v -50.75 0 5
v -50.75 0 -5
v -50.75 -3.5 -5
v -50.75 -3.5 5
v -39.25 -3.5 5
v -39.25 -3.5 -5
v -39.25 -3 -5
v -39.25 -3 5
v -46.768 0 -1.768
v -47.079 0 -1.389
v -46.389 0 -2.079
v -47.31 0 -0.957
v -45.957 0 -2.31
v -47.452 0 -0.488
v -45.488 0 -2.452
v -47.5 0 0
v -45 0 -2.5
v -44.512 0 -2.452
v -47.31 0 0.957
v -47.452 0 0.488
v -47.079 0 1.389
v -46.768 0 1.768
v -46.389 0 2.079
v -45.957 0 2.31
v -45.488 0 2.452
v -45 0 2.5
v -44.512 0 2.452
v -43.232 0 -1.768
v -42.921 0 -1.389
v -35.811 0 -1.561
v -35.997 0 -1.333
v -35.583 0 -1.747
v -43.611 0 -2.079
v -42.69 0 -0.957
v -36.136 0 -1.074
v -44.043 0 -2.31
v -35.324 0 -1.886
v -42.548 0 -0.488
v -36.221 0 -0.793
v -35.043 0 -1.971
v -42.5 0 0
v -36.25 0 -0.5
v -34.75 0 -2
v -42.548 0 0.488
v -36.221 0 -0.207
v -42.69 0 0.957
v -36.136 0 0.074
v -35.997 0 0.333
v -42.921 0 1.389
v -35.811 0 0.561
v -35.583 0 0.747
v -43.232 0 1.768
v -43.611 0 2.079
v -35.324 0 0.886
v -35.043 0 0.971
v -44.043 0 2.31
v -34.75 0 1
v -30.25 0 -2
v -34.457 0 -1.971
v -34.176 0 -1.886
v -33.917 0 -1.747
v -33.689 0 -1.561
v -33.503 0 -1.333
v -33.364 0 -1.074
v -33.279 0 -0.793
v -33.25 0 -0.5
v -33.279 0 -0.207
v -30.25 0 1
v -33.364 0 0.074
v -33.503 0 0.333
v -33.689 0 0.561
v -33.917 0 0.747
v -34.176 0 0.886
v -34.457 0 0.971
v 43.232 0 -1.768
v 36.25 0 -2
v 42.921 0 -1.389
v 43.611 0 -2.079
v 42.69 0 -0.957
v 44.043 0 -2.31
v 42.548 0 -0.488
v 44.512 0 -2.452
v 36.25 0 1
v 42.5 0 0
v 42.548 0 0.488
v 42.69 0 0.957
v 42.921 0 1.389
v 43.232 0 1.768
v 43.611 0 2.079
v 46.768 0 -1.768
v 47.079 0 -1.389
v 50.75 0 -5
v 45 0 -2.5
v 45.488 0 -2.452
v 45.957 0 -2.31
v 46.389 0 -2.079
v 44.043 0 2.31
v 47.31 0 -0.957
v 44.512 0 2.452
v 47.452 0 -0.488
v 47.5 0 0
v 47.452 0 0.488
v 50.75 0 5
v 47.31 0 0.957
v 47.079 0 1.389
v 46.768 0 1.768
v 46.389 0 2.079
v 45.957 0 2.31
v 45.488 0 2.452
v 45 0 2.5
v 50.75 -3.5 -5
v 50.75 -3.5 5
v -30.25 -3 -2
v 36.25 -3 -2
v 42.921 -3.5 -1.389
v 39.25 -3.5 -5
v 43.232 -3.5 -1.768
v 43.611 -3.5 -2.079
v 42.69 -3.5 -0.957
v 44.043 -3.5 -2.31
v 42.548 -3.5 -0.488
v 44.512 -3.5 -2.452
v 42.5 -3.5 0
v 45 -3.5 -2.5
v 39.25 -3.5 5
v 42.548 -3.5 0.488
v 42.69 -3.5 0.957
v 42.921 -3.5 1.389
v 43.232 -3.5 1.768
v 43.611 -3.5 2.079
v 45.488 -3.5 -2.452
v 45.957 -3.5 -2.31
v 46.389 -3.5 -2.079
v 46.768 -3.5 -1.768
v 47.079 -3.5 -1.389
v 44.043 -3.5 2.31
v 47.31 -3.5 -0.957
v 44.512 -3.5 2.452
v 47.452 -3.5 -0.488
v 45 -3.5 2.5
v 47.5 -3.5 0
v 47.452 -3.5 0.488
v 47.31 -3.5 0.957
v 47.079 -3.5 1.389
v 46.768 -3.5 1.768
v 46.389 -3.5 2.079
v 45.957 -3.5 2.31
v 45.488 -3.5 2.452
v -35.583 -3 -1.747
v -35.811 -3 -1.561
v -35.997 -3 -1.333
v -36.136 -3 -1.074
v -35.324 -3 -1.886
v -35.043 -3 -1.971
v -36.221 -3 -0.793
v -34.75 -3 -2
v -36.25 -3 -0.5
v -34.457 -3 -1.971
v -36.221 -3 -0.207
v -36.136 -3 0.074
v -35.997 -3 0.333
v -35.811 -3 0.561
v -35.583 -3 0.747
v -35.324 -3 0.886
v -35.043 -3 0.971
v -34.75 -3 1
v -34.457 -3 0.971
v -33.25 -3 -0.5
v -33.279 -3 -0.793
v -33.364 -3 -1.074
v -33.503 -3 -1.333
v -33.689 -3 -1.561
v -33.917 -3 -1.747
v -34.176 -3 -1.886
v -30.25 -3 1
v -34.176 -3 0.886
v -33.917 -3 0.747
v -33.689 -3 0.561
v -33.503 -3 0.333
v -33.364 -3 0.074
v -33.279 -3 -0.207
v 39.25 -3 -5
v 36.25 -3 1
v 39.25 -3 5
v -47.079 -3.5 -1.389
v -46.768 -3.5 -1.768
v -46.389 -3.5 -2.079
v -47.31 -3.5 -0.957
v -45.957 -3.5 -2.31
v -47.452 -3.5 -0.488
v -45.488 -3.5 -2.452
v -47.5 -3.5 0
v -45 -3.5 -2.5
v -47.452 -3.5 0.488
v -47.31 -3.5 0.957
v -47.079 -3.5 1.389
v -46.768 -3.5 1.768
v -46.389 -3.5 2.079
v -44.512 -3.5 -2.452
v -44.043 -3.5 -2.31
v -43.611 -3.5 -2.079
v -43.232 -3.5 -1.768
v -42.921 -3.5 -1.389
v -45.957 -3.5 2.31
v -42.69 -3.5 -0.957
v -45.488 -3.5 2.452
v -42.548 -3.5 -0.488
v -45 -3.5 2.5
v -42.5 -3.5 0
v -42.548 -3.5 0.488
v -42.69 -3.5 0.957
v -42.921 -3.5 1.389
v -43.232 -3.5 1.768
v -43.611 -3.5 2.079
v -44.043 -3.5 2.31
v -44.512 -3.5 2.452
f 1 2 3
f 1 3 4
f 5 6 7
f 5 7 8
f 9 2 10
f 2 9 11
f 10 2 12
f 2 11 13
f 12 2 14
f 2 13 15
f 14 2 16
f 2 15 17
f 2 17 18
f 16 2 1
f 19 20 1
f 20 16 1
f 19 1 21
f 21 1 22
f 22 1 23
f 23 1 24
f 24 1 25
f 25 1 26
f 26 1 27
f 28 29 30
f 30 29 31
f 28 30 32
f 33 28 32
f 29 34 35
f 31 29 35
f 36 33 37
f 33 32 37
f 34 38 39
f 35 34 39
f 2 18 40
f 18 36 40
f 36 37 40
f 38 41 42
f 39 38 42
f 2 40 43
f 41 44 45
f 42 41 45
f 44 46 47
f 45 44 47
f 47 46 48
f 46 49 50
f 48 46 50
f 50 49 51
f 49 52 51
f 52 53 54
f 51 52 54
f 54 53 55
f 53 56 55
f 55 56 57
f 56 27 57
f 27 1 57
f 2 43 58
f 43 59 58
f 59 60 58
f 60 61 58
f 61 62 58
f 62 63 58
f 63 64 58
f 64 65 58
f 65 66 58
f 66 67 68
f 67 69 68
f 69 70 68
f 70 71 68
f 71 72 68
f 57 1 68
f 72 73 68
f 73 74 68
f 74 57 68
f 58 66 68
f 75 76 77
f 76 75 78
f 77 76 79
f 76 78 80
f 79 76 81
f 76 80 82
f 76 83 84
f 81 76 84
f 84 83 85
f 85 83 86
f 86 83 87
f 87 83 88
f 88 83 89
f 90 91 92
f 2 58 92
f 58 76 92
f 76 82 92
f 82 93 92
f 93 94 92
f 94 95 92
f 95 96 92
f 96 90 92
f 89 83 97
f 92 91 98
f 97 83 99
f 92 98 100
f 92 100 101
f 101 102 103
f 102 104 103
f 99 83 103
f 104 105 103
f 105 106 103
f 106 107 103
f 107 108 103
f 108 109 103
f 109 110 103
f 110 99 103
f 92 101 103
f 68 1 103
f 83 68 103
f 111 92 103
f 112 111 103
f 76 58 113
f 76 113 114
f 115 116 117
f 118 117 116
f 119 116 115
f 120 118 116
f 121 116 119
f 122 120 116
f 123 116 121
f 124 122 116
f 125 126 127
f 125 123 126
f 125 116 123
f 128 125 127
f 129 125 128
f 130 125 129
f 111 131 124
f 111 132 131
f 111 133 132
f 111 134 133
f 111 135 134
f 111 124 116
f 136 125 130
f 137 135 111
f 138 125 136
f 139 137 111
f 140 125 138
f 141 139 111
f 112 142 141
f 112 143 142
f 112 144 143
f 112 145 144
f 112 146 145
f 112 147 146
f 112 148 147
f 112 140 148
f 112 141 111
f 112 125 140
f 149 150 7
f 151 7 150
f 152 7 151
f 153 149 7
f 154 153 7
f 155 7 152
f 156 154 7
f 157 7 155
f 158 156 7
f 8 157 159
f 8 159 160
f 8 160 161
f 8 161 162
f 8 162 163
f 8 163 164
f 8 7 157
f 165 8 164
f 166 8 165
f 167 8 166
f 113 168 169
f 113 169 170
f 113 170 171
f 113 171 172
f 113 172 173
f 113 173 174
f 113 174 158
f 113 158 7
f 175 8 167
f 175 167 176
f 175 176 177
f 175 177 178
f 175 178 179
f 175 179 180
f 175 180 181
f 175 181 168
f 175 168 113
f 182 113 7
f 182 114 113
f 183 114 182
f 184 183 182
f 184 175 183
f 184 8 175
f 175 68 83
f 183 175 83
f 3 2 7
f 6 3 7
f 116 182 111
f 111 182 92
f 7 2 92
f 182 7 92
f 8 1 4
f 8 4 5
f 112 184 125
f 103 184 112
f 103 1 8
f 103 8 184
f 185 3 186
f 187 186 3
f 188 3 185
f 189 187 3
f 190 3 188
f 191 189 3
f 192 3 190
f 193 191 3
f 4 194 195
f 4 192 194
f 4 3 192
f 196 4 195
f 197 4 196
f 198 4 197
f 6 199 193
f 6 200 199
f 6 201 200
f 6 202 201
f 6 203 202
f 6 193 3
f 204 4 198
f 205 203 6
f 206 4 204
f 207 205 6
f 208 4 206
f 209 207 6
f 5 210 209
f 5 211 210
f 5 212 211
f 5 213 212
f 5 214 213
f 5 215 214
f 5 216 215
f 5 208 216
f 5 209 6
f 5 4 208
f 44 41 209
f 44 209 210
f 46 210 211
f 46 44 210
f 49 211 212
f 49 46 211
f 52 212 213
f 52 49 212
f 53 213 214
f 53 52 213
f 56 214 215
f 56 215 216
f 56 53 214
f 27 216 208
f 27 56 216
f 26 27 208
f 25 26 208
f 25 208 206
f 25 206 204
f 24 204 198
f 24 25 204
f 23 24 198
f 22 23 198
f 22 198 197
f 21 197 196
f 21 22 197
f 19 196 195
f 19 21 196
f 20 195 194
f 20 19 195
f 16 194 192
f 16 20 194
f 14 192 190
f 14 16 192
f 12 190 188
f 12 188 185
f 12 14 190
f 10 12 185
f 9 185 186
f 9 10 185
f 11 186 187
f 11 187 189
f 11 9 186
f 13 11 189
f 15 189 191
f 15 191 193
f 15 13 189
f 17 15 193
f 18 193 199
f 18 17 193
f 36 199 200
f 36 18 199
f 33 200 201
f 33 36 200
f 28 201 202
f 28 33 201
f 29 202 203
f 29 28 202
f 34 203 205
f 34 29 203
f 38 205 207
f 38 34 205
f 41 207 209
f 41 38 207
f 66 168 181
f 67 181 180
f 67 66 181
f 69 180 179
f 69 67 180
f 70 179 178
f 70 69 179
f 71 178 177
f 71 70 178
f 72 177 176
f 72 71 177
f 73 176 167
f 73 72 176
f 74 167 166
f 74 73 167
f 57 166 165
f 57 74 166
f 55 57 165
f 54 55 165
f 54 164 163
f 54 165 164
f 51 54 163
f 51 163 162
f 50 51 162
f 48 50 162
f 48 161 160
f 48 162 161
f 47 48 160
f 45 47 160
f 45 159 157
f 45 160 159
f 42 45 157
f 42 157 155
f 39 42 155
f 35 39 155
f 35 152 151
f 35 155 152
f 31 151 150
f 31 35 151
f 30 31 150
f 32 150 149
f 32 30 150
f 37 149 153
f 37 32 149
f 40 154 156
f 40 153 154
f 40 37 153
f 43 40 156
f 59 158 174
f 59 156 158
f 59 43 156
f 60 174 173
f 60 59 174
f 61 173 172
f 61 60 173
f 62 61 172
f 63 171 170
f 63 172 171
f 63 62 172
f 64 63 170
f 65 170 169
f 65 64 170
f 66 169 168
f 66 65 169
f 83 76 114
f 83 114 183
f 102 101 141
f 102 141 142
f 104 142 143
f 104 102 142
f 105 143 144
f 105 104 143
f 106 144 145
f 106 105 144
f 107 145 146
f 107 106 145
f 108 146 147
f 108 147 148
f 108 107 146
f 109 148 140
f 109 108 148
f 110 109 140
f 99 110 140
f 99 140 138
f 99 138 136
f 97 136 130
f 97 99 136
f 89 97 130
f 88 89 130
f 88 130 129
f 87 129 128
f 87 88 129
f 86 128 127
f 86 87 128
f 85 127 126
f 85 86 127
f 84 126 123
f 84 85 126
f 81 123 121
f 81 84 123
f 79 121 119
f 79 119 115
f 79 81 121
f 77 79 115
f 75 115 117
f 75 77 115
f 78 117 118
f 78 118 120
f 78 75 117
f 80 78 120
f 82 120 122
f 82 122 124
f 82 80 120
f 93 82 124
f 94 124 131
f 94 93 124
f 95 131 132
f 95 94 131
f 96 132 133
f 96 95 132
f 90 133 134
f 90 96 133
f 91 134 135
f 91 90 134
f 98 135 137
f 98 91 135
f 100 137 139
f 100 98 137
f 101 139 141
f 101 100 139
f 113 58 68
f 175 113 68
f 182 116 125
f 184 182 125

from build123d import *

# Parameters (mm, degrees)
F0_W     = 101.5
F0_H     = 10
F0_R     = 1.5
F0_W_2   = 66.5
F0_H_2   = 3
F0_R_2   = 2.5
F1_DEPTH = 3.5
F2_W     = 78.5
F2_H     = 10
F3_DEPTH = 0.5


with BuildPart() as f1:
    # F0 (on Front) → F1 (new body)
    with BuildSketch(Plane.XZ):
        Rectangle(F0_W, F0_H)
        with Locations((-34.75, -0.5)):
            Circle(F0_R, mode=Mode.SUBTRACT)
        with Locations((3, -0.5)):
            Rectangle(F0_W_2, F0_H_2, mode=Mode.SUBTRACT)
        with Locations((-45, 0)):
            Circle(F0_R_2, mode=Mode.SUBTRACT)
        with Locations((45, 0)):
            Circle(F0_R_2, mode=Mode.SUBTRACT)
    extrude(amount=F1_DEPTH)

    # F2 (on face) → F3 (cut)
    with BuildSketch(Plane.XZ.offset(3.5)):
        Rectangle(F2_W, F2_H)
    extrude(amount=-F3_DEPTH, mode=Mode.SUBTRACT)


solid = f1.part
